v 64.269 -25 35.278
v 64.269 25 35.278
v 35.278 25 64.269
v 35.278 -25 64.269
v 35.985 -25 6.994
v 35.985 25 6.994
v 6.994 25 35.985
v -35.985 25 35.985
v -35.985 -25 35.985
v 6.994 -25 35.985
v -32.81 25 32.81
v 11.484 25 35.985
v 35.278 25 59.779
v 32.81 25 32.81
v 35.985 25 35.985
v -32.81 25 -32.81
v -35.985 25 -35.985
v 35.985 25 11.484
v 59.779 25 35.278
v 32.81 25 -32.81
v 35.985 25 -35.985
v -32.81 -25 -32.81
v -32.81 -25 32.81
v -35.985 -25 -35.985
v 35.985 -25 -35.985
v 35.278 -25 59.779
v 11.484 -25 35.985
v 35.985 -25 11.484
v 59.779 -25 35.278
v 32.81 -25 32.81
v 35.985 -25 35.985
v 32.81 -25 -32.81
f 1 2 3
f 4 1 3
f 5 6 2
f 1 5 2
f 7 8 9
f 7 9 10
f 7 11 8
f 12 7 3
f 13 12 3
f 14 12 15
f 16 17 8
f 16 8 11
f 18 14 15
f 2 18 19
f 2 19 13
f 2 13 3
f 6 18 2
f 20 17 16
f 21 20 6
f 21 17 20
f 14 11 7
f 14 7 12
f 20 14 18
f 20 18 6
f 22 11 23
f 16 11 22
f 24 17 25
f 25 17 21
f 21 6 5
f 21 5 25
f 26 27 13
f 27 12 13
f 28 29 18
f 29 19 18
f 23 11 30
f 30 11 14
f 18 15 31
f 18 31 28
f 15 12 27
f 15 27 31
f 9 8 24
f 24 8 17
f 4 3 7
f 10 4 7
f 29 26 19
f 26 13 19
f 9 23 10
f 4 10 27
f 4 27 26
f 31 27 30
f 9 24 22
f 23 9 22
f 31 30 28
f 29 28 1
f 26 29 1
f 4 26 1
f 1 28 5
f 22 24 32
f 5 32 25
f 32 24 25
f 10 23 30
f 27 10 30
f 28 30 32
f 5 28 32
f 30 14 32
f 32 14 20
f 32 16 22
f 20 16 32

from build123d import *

# Parameters (mm, degrees)
SKETCH1_W           = 71.97
SKETCH1_H           = 71.97
SKETCH1_W_2         = 65.62
SKETCH1_H_2         = 65.62
BOSS_EXTRUDE1_DEPTH = 25
BOSS_EXTRUDE2_DEPTH = 25


with BuildPart() as part:
    # Sketch1 → Boss-Extrude1 (new, symmetric)
    with BuildSketch(Plane(origin=(0, 0, 0), x_dir=(1, 0, 0), z_dir=(0, 1, 0))):
        Rectangle(SKETCH1_W, SKETCH1_H)
        Rectangle(SKETCH1_W_2, SKETCH1_H_2, mode=Mode.SUBTRACT)
    extrude(amount=BOSS_EXTRUDE1_DEPTH, both=True)

    # Sketch2 → Boss-Extrude2 (add, symmetric)
    with BuildSketch(Plane(origin=(0, 0, 0), x_dir=(1, 0, 0), z_dir=(0, 1, 0))):
        Polygon((35.277893219, -64.269271247), (6.993621971, -35.985), (11.483750032, -35.985), (35.277893219, -59.779143187), (59.779143187, -35.277893219), (35.985, -11.483750032), (35.985, -6.993621971), (64.269271247, -35.277893219), align=None)
    extrude(amount=BOSS_EXTRUDE2_DEPTH, both=True)


solid = part.part
